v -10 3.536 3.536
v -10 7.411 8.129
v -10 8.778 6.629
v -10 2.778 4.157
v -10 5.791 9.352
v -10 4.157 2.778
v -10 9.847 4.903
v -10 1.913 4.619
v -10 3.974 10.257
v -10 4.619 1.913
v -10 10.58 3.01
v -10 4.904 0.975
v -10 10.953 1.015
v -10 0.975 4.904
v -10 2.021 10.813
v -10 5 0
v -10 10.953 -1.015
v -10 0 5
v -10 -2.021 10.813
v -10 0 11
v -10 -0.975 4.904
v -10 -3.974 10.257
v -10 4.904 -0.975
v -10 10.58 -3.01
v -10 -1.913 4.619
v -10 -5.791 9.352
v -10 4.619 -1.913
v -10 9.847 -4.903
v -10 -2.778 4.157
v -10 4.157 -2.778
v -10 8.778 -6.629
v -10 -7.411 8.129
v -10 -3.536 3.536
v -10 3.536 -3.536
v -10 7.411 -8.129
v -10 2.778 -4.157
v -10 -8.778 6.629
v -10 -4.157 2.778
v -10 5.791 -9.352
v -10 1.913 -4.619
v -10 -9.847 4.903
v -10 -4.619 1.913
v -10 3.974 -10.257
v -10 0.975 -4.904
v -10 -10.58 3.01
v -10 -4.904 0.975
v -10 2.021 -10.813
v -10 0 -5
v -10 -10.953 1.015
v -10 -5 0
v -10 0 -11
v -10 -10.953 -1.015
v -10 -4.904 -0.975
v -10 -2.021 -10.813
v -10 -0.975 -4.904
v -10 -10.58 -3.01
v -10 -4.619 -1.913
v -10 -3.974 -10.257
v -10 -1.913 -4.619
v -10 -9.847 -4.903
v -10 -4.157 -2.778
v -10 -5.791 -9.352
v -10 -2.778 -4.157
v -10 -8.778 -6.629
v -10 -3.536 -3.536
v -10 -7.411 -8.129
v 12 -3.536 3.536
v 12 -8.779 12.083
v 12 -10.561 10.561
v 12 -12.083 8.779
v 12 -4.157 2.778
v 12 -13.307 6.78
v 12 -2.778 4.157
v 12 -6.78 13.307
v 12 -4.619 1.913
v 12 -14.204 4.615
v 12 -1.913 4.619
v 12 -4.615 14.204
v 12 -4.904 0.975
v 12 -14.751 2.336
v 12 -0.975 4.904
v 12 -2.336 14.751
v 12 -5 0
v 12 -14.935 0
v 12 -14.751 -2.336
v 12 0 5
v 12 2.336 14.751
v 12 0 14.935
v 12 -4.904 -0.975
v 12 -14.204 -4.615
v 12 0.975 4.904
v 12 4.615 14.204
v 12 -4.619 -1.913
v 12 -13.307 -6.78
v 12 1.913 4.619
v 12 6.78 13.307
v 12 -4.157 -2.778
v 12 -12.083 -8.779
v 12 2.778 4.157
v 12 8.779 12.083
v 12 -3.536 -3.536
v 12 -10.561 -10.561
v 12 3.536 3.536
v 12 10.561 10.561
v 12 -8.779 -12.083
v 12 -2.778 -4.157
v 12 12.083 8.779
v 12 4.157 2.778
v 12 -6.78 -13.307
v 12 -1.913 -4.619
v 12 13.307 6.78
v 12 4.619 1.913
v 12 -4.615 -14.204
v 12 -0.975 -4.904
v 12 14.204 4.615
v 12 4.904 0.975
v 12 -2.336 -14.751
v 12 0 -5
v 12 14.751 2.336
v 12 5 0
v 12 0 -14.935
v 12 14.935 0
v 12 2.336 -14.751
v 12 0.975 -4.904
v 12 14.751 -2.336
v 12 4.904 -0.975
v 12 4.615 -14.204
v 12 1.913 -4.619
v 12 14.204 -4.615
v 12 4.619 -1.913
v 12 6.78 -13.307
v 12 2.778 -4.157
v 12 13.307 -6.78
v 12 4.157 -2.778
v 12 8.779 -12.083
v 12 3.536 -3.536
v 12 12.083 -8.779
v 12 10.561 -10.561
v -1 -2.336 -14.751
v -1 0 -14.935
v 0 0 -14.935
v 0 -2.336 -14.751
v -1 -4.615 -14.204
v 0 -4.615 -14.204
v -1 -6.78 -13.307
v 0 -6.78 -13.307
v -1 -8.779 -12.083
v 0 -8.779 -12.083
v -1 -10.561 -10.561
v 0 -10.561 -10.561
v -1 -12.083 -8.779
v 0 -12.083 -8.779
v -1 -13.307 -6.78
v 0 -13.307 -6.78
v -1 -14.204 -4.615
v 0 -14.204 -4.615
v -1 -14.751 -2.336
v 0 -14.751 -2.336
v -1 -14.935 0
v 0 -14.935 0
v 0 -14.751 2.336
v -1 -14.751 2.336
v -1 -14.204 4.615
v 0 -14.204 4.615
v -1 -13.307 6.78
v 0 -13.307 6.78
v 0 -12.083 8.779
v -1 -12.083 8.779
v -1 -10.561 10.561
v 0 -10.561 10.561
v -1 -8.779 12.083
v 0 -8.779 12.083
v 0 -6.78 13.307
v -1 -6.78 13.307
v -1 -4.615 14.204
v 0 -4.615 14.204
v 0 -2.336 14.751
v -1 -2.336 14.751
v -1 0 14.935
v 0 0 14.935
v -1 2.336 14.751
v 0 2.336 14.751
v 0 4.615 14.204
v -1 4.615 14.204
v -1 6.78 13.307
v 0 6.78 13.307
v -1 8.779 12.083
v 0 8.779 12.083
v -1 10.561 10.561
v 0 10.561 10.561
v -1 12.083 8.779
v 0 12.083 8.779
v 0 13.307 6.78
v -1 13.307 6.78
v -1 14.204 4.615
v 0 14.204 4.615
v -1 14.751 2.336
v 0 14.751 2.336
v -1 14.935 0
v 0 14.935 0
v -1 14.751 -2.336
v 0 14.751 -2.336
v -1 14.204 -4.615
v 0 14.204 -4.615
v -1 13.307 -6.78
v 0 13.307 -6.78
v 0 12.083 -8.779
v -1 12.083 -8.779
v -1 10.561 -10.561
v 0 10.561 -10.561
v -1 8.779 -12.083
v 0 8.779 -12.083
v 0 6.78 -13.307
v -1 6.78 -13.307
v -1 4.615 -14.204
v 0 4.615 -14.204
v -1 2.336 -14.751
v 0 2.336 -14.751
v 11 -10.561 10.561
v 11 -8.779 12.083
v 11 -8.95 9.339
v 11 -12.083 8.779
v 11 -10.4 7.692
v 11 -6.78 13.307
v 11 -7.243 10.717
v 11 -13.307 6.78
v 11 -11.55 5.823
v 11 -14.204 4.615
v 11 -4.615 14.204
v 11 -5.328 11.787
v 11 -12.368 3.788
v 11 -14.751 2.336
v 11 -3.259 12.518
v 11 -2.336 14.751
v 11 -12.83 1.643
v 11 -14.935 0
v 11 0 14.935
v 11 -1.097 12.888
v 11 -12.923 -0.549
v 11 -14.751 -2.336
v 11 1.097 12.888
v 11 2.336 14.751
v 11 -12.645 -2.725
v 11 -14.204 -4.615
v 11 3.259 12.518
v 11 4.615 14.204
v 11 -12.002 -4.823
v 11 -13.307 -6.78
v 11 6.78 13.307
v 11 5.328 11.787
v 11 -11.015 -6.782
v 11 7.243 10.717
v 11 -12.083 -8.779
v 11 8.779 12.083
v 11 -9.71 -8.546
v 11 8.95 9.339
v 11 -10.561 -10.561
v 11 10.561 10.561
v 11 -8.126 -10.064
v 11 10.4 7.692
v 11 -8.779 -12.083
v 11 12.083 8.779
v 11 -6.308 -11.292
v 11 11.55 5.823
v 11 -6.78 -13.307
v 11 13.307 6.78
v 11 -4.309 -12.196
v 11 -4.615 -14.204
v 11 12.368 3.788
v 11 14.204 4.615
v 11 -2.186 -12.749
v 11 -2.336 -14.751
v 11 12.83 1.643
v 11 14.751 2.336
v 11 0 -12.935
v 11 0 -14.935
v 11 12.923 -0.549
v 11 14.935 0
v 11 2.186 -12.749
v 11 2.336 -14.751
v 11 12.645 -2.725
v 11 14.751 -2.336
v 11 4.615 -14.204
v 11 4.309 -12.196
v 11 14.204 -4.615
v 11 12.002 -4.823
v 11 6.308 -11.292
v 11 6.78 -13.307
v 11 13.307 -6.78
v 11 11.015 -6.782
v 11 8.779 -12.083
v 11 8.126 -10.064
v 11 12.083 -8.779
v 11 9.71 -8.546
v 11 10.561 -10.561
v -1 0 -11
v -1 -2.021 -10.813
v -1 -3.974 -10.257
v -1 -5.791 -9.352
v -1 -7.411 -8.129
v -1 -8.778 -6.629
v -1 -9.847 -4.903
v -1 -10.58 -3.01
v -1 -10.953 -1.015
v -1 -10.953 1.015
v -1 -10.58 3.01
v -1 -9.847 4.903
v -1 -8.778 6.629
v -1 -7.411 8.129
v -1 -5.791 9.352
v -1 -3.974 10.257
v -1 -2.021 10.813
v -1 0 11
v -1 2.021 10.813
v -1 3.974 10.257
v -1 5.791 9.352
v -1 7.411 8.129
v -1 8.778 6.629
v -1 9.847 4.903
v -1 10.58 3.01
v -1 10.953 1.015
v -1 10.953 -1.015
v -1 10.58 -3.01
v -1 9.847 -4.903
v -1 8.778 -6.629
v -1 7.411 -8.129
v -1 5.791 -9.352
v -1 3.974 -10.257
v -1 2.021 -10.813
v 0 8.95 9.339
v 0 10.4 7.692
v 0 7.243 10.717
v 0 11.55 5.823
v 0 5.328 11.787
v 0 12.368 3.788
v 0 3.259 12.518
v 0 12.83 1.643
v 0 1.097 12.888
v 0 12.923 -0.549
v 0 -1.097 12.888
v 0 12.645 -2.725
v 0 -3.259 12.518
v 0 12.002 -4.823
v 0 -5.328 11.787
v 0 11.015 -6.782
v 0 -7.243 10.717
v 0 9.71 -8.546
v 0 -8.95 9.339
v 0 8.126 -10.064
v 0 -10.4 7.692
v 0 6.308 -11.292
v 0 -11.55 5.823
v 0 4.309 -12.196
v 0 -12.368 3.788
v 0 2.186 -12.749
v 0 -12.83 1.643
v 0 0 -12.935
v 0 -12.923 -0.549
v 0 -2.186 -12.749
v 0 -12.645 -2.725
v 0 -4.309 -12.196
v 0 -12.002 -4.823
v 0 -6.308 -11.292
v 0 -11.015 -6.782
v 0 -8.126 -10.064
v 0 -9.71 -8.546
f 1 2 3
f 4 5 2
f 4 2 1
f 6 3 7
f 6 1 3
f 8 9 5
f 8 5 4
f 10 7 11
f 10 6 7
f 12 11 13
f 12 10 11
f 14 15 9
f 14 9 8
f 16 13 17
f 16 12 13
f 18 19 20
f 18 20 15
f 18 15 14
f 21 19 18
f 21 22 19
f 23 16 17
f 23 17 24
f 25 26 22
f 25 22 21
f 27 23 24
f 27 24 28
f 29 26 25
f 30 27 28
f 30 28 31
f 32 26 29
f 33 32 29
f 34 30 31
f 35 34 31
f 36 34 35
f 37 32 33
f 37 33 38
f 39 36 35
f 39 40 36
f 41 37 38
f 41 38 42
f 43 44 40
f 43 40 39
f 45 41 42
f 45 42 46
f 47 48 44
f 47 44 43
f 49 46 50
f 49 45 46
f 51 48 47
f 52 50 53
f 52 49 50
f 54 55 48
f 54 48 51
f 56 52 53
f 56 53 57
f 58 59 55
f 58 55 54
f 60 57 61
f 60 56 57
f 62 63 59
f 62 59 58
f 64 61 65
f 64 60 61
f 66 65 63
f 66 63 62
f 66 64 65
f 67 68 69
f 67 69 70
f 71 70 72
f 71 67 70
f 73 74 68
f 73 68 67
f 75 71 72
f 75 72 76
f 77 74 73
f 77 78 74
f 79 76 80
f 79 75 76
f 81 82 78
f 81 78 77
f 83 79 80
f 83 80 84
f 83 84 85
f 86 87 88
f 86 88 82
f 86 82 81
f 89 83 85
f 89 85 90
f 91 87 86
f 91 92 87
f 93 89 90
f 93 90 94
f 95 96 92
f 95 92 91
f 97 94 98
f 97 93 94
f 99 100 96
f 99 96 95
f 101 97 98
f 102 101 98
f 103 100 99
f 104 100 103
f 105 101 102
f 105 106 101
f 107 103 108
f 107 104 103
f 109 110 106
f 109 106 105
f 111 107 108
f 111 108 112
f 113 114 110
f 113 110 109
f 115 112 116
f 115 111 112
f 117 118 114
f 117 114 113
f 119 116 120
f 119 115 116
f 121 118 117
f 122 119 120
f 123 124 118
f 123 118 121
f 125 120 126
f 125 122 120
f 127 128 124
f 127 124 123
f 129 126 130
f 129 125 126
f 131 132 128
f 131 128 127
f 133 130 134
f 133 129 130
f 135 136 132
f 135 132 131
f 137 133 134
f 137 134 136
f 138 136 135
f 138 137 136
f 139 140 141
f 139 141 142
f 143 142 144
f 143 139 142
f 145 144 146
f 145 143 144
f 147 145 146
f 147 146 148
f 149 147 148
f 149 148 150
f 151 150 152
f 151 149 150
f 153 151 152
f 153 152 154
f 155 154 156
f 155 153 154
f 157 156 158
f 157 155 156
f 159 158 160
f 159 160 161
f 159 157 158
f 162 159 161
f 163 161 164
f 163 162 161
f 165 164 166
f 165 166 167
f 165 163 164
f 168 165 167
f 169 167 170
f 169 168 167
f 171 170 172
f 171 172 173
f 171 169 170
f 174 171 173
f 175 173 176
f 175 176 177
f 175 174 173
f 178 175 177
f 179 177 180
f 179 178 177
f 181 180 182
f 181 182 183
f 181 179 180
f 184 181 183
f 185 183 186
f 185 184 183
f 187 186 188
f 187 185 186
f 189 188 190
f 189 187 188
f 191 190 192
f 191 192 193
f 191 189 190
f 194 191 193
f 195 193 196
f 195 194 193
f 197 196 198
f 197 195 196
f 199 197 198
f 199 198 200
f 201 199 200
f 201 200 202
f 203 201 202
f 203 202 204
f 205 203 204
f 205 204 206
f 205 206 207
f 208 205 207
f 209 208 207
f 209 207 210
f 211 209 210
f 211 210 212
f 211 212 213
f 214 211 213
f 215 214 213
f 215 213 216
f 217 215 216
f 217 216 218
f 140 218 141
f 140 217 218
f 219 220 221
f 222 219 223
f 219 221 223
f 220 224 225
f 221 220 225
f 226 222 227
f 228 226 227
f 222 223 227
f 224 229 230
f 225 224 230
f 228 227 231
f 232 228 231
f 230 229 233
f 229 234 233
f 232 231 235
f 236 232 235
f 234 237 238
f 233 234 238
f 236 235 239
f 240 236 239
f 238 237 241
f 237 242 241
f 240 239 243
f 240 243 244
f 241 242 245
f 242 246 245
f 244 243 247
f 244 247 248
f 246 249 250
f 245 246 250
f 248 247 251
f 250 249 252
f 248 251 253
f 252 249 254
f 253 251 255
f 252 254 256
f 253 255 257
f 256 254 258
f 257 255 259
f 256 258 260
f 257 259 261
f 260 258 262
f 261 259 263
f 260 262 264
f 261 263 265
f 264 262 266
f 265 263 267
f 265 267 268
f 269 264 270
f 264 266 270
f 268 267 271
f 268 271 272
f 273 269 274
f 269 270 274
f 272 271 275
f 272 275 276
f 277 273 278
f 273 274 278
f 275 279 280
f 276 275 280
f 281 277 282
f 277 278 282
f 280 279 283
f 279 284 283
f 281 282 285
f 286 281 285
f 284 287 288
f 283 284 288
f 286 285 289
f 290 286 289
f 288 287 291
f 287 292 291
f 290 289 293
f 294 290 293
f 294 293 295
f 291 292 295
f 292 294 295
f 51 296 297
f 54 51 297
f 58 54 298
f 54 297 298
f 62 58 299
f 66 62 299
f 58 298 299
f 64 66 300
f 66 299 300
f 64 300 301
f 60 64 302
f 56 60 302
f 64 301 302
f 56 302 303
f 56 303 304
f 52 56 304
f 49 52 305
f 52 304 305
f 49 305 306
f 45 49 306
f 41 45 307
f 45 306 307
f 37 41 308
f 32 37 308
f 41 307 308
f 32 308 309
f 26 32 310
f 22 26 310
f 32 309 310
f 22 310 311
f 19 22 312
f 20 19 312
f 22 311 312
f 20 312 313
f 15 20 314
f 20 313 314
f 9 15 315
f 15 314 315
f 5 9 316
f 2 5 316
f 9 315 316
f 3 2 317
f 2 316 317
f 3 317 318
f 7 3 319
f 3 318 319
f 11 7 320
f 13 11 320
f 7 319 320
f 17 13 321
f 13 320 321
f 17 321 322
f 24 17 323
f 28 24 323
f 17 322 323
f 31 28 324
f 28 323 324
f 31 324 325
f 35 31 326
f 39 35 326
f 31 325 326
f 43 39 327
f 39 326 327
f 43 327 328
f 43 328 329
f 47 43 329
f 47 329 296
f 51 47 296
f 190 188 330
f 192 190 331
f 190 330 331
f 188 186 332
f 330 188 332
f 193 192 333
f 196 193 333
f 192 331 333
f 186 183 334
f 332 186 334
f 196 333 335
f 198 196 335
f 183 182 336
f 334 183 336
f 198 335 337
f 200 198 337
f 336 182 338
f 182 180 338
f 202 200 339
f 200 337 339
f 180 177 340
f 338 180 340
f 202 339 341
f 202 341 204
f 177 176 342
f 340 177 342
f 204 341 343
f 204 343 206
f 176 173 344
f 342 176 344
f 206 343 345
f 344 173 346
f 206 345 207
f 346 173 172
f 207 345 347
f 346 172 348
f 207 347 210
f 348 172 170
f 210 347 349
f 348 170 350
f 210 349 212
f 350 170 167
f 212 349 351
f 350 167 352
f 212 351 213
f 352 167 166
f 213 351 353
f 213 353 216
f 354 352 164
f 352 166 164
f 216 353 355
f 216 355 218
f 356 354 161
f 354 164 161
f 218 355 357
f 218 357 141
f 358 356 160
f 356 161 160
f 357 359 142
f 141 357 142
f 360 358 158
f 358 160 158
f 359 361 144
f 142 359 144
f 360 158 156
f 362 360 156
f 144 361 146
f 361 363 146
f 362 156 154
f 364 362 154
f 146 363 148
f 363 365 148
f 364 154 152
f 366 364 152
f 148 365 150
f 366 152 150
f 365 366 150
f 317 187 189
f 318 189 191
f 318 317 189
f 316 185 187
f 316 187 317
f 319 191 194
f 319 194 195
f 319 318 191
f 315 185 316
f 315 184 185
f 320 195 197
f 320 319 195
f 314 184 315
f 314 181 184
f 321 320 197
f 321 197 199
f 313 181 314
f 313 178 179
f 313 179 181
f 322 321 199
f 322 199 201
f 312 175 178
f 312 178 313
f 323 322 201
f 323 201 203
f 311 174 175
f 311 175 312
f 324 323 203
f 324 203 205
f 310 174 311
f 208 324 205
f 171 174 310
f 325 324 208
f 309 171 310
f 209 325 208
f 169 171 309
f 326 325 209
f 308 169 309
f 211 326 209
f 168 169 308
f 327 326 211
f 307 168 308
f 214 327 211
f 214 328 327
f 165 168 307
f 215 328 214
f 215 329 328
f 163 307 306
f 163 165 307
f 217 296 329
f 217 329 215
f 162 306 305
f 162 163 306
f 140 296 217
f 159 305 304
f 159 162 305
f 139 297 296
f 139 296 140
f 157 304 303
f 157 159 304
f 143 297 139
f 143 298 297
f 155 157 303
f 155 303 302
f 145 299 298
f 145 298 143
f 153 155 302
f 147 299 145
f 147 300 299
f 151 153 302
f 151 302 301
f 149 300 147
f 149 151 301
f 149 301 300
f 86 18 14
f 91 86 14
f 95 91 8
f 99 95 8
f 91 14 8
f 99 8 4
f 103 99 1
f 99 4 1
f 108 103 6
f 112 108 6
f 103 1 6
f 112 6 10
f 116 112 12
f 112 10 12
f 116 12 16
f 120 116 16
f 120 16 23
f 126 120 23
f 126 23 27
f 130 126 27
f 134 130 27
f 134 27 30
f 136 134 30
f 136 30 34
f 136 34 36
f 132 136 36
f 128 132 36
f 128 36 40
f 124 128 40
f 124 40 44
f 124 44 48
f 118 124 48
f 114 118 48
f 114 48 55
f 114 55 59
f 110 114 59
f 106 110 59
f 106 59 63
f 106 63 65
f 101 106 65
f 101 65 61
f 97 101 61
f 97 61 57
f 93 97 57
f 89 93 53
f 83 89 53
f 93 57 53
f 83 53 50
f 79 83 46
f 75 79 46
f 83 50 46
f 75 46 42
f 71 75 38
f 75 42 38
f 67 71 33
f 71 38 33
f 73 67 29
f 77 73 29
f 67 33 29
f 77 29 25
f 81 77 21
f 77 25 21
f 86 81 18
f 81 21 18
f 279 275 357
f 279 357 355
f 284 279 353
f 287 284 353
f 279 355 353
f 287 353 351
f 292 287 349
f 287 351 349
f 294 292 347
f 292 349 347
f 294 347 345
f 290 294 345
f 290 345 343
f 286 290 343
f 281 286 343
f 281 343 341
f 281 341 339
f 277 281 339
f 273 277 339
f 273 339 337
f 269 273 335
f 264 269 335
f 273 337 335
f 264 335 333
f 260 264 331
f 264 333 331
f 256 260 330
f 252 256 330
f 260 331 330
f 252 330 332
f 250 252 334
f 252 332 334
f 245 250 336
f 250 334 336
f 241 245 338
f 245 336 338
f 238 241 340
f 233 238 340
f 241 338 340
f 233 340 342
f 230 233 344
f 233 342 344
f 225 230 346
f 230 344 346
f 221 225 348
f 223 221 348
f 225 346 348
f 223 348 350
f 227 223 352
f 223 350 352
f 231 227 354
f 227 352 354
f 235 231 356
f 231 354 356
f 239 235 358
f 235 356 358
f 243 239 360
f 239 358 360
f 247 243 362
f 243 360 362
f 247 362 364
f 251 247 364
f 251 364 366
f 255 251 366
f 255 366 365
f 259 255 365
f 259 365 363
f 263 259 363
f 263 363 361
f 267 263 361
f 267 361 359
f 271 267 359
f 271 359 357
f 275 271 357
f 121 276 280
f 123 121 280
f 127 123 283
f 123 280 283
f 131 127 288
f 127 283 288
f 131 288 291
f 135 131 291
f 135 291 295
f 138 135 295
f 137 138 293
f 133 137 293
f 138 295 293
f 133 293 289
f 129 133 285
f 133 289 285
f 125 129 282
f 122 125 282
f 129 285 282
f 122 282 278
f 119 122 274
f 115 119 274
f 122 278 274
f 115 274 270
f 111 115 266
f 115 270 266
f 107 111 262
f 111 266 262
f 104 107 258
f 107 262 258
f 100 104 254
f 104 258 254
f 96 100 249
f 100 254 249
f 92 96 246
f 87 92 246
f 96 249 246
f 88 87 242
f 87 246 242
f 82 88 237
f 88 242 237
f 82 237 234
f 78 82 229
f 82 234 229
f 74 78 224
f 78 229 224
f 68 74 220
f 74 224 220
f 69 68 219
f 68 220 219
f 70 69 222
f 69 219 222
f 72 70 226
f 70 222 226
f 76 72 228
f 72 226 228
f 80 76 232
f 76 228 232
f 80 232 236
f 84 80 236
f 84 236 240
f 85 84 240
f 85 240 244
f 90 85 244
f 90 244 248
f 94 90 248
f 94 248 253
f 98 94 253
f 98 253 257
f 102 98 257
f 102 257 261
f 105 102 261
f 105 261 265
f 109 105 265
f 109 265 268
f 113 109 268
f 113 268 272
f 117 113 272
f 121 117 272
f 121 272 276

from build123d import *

# Parameters (mm, degrees)
SKETCH_1_R          = 12.935
EXTRUDE_1_DEPTH     = 11
SKETCH_2_R          = 14.935
EXTRUDE_2_DEPTH     = 1
EXTRUDE_START       = 1
SKETCH_3_R          = 14.935
EXTRUDE_3_DEPTH     = 1
SKETCH_4_R          = 11
EXTRUDE_4_DEPTH     = 9
SKETCH_5_R          = 5
CUT_EXTRUDE_1_DEPTH = 30


with BuildPart() as part:
    # 草图1 → 凸台-拉伸1 (new body)
    with BuildSketch(Plane(origin=(0, 0, 0), x_dir=(0, 0, -1), z_dir=(1, 0, 0))):
        Circle(SKETCH_1_R)
    extrude(amount=EXTRUDE_1_DEPTH)

    # 草图2 → 凸台-拉伸2 (add)
    with BuildSketch(Plane(origin=(11, 0, 0), x_dir=(0, 0, -1), z_dir=(1, 0, 0))):
        Circle(SKETCH_2_R)
    extrude(amount=EXTRUDE_2_DEPTH)

    # 草图3 → 凸台-拉伸3 (add)
    with BuildSketch(Plane.ZY.offset(EXTRUDE_START)):
        with Locations(Location((0, 0, 0), (0, 0, 180))):
            Circle(SKETCH_3_R)
    extrude(amount=-EXTRUDE_3_DEPTH)

    # 草图4 → 凸台-拉伸4 (add)
    with BuildSketch(Plane.ZY.offset(1)):
        with Locations(Location((0, 0, 0), (0, 0, 180))):
            Circle(SKETCH_4_R)
    extrude(amount=EXTRUDE_4_DEPTH)

    # 草图5 → 切除-拉伸1 (cut)
    with BuildSketch(Plane.ZY.offset(10)):
        Circle(SKETCH_5_R)
    extrude(amount=-CUT_EXTRUDE_1_DEPTH, mode=Mode.SUBTRACT)


solid = part.part
